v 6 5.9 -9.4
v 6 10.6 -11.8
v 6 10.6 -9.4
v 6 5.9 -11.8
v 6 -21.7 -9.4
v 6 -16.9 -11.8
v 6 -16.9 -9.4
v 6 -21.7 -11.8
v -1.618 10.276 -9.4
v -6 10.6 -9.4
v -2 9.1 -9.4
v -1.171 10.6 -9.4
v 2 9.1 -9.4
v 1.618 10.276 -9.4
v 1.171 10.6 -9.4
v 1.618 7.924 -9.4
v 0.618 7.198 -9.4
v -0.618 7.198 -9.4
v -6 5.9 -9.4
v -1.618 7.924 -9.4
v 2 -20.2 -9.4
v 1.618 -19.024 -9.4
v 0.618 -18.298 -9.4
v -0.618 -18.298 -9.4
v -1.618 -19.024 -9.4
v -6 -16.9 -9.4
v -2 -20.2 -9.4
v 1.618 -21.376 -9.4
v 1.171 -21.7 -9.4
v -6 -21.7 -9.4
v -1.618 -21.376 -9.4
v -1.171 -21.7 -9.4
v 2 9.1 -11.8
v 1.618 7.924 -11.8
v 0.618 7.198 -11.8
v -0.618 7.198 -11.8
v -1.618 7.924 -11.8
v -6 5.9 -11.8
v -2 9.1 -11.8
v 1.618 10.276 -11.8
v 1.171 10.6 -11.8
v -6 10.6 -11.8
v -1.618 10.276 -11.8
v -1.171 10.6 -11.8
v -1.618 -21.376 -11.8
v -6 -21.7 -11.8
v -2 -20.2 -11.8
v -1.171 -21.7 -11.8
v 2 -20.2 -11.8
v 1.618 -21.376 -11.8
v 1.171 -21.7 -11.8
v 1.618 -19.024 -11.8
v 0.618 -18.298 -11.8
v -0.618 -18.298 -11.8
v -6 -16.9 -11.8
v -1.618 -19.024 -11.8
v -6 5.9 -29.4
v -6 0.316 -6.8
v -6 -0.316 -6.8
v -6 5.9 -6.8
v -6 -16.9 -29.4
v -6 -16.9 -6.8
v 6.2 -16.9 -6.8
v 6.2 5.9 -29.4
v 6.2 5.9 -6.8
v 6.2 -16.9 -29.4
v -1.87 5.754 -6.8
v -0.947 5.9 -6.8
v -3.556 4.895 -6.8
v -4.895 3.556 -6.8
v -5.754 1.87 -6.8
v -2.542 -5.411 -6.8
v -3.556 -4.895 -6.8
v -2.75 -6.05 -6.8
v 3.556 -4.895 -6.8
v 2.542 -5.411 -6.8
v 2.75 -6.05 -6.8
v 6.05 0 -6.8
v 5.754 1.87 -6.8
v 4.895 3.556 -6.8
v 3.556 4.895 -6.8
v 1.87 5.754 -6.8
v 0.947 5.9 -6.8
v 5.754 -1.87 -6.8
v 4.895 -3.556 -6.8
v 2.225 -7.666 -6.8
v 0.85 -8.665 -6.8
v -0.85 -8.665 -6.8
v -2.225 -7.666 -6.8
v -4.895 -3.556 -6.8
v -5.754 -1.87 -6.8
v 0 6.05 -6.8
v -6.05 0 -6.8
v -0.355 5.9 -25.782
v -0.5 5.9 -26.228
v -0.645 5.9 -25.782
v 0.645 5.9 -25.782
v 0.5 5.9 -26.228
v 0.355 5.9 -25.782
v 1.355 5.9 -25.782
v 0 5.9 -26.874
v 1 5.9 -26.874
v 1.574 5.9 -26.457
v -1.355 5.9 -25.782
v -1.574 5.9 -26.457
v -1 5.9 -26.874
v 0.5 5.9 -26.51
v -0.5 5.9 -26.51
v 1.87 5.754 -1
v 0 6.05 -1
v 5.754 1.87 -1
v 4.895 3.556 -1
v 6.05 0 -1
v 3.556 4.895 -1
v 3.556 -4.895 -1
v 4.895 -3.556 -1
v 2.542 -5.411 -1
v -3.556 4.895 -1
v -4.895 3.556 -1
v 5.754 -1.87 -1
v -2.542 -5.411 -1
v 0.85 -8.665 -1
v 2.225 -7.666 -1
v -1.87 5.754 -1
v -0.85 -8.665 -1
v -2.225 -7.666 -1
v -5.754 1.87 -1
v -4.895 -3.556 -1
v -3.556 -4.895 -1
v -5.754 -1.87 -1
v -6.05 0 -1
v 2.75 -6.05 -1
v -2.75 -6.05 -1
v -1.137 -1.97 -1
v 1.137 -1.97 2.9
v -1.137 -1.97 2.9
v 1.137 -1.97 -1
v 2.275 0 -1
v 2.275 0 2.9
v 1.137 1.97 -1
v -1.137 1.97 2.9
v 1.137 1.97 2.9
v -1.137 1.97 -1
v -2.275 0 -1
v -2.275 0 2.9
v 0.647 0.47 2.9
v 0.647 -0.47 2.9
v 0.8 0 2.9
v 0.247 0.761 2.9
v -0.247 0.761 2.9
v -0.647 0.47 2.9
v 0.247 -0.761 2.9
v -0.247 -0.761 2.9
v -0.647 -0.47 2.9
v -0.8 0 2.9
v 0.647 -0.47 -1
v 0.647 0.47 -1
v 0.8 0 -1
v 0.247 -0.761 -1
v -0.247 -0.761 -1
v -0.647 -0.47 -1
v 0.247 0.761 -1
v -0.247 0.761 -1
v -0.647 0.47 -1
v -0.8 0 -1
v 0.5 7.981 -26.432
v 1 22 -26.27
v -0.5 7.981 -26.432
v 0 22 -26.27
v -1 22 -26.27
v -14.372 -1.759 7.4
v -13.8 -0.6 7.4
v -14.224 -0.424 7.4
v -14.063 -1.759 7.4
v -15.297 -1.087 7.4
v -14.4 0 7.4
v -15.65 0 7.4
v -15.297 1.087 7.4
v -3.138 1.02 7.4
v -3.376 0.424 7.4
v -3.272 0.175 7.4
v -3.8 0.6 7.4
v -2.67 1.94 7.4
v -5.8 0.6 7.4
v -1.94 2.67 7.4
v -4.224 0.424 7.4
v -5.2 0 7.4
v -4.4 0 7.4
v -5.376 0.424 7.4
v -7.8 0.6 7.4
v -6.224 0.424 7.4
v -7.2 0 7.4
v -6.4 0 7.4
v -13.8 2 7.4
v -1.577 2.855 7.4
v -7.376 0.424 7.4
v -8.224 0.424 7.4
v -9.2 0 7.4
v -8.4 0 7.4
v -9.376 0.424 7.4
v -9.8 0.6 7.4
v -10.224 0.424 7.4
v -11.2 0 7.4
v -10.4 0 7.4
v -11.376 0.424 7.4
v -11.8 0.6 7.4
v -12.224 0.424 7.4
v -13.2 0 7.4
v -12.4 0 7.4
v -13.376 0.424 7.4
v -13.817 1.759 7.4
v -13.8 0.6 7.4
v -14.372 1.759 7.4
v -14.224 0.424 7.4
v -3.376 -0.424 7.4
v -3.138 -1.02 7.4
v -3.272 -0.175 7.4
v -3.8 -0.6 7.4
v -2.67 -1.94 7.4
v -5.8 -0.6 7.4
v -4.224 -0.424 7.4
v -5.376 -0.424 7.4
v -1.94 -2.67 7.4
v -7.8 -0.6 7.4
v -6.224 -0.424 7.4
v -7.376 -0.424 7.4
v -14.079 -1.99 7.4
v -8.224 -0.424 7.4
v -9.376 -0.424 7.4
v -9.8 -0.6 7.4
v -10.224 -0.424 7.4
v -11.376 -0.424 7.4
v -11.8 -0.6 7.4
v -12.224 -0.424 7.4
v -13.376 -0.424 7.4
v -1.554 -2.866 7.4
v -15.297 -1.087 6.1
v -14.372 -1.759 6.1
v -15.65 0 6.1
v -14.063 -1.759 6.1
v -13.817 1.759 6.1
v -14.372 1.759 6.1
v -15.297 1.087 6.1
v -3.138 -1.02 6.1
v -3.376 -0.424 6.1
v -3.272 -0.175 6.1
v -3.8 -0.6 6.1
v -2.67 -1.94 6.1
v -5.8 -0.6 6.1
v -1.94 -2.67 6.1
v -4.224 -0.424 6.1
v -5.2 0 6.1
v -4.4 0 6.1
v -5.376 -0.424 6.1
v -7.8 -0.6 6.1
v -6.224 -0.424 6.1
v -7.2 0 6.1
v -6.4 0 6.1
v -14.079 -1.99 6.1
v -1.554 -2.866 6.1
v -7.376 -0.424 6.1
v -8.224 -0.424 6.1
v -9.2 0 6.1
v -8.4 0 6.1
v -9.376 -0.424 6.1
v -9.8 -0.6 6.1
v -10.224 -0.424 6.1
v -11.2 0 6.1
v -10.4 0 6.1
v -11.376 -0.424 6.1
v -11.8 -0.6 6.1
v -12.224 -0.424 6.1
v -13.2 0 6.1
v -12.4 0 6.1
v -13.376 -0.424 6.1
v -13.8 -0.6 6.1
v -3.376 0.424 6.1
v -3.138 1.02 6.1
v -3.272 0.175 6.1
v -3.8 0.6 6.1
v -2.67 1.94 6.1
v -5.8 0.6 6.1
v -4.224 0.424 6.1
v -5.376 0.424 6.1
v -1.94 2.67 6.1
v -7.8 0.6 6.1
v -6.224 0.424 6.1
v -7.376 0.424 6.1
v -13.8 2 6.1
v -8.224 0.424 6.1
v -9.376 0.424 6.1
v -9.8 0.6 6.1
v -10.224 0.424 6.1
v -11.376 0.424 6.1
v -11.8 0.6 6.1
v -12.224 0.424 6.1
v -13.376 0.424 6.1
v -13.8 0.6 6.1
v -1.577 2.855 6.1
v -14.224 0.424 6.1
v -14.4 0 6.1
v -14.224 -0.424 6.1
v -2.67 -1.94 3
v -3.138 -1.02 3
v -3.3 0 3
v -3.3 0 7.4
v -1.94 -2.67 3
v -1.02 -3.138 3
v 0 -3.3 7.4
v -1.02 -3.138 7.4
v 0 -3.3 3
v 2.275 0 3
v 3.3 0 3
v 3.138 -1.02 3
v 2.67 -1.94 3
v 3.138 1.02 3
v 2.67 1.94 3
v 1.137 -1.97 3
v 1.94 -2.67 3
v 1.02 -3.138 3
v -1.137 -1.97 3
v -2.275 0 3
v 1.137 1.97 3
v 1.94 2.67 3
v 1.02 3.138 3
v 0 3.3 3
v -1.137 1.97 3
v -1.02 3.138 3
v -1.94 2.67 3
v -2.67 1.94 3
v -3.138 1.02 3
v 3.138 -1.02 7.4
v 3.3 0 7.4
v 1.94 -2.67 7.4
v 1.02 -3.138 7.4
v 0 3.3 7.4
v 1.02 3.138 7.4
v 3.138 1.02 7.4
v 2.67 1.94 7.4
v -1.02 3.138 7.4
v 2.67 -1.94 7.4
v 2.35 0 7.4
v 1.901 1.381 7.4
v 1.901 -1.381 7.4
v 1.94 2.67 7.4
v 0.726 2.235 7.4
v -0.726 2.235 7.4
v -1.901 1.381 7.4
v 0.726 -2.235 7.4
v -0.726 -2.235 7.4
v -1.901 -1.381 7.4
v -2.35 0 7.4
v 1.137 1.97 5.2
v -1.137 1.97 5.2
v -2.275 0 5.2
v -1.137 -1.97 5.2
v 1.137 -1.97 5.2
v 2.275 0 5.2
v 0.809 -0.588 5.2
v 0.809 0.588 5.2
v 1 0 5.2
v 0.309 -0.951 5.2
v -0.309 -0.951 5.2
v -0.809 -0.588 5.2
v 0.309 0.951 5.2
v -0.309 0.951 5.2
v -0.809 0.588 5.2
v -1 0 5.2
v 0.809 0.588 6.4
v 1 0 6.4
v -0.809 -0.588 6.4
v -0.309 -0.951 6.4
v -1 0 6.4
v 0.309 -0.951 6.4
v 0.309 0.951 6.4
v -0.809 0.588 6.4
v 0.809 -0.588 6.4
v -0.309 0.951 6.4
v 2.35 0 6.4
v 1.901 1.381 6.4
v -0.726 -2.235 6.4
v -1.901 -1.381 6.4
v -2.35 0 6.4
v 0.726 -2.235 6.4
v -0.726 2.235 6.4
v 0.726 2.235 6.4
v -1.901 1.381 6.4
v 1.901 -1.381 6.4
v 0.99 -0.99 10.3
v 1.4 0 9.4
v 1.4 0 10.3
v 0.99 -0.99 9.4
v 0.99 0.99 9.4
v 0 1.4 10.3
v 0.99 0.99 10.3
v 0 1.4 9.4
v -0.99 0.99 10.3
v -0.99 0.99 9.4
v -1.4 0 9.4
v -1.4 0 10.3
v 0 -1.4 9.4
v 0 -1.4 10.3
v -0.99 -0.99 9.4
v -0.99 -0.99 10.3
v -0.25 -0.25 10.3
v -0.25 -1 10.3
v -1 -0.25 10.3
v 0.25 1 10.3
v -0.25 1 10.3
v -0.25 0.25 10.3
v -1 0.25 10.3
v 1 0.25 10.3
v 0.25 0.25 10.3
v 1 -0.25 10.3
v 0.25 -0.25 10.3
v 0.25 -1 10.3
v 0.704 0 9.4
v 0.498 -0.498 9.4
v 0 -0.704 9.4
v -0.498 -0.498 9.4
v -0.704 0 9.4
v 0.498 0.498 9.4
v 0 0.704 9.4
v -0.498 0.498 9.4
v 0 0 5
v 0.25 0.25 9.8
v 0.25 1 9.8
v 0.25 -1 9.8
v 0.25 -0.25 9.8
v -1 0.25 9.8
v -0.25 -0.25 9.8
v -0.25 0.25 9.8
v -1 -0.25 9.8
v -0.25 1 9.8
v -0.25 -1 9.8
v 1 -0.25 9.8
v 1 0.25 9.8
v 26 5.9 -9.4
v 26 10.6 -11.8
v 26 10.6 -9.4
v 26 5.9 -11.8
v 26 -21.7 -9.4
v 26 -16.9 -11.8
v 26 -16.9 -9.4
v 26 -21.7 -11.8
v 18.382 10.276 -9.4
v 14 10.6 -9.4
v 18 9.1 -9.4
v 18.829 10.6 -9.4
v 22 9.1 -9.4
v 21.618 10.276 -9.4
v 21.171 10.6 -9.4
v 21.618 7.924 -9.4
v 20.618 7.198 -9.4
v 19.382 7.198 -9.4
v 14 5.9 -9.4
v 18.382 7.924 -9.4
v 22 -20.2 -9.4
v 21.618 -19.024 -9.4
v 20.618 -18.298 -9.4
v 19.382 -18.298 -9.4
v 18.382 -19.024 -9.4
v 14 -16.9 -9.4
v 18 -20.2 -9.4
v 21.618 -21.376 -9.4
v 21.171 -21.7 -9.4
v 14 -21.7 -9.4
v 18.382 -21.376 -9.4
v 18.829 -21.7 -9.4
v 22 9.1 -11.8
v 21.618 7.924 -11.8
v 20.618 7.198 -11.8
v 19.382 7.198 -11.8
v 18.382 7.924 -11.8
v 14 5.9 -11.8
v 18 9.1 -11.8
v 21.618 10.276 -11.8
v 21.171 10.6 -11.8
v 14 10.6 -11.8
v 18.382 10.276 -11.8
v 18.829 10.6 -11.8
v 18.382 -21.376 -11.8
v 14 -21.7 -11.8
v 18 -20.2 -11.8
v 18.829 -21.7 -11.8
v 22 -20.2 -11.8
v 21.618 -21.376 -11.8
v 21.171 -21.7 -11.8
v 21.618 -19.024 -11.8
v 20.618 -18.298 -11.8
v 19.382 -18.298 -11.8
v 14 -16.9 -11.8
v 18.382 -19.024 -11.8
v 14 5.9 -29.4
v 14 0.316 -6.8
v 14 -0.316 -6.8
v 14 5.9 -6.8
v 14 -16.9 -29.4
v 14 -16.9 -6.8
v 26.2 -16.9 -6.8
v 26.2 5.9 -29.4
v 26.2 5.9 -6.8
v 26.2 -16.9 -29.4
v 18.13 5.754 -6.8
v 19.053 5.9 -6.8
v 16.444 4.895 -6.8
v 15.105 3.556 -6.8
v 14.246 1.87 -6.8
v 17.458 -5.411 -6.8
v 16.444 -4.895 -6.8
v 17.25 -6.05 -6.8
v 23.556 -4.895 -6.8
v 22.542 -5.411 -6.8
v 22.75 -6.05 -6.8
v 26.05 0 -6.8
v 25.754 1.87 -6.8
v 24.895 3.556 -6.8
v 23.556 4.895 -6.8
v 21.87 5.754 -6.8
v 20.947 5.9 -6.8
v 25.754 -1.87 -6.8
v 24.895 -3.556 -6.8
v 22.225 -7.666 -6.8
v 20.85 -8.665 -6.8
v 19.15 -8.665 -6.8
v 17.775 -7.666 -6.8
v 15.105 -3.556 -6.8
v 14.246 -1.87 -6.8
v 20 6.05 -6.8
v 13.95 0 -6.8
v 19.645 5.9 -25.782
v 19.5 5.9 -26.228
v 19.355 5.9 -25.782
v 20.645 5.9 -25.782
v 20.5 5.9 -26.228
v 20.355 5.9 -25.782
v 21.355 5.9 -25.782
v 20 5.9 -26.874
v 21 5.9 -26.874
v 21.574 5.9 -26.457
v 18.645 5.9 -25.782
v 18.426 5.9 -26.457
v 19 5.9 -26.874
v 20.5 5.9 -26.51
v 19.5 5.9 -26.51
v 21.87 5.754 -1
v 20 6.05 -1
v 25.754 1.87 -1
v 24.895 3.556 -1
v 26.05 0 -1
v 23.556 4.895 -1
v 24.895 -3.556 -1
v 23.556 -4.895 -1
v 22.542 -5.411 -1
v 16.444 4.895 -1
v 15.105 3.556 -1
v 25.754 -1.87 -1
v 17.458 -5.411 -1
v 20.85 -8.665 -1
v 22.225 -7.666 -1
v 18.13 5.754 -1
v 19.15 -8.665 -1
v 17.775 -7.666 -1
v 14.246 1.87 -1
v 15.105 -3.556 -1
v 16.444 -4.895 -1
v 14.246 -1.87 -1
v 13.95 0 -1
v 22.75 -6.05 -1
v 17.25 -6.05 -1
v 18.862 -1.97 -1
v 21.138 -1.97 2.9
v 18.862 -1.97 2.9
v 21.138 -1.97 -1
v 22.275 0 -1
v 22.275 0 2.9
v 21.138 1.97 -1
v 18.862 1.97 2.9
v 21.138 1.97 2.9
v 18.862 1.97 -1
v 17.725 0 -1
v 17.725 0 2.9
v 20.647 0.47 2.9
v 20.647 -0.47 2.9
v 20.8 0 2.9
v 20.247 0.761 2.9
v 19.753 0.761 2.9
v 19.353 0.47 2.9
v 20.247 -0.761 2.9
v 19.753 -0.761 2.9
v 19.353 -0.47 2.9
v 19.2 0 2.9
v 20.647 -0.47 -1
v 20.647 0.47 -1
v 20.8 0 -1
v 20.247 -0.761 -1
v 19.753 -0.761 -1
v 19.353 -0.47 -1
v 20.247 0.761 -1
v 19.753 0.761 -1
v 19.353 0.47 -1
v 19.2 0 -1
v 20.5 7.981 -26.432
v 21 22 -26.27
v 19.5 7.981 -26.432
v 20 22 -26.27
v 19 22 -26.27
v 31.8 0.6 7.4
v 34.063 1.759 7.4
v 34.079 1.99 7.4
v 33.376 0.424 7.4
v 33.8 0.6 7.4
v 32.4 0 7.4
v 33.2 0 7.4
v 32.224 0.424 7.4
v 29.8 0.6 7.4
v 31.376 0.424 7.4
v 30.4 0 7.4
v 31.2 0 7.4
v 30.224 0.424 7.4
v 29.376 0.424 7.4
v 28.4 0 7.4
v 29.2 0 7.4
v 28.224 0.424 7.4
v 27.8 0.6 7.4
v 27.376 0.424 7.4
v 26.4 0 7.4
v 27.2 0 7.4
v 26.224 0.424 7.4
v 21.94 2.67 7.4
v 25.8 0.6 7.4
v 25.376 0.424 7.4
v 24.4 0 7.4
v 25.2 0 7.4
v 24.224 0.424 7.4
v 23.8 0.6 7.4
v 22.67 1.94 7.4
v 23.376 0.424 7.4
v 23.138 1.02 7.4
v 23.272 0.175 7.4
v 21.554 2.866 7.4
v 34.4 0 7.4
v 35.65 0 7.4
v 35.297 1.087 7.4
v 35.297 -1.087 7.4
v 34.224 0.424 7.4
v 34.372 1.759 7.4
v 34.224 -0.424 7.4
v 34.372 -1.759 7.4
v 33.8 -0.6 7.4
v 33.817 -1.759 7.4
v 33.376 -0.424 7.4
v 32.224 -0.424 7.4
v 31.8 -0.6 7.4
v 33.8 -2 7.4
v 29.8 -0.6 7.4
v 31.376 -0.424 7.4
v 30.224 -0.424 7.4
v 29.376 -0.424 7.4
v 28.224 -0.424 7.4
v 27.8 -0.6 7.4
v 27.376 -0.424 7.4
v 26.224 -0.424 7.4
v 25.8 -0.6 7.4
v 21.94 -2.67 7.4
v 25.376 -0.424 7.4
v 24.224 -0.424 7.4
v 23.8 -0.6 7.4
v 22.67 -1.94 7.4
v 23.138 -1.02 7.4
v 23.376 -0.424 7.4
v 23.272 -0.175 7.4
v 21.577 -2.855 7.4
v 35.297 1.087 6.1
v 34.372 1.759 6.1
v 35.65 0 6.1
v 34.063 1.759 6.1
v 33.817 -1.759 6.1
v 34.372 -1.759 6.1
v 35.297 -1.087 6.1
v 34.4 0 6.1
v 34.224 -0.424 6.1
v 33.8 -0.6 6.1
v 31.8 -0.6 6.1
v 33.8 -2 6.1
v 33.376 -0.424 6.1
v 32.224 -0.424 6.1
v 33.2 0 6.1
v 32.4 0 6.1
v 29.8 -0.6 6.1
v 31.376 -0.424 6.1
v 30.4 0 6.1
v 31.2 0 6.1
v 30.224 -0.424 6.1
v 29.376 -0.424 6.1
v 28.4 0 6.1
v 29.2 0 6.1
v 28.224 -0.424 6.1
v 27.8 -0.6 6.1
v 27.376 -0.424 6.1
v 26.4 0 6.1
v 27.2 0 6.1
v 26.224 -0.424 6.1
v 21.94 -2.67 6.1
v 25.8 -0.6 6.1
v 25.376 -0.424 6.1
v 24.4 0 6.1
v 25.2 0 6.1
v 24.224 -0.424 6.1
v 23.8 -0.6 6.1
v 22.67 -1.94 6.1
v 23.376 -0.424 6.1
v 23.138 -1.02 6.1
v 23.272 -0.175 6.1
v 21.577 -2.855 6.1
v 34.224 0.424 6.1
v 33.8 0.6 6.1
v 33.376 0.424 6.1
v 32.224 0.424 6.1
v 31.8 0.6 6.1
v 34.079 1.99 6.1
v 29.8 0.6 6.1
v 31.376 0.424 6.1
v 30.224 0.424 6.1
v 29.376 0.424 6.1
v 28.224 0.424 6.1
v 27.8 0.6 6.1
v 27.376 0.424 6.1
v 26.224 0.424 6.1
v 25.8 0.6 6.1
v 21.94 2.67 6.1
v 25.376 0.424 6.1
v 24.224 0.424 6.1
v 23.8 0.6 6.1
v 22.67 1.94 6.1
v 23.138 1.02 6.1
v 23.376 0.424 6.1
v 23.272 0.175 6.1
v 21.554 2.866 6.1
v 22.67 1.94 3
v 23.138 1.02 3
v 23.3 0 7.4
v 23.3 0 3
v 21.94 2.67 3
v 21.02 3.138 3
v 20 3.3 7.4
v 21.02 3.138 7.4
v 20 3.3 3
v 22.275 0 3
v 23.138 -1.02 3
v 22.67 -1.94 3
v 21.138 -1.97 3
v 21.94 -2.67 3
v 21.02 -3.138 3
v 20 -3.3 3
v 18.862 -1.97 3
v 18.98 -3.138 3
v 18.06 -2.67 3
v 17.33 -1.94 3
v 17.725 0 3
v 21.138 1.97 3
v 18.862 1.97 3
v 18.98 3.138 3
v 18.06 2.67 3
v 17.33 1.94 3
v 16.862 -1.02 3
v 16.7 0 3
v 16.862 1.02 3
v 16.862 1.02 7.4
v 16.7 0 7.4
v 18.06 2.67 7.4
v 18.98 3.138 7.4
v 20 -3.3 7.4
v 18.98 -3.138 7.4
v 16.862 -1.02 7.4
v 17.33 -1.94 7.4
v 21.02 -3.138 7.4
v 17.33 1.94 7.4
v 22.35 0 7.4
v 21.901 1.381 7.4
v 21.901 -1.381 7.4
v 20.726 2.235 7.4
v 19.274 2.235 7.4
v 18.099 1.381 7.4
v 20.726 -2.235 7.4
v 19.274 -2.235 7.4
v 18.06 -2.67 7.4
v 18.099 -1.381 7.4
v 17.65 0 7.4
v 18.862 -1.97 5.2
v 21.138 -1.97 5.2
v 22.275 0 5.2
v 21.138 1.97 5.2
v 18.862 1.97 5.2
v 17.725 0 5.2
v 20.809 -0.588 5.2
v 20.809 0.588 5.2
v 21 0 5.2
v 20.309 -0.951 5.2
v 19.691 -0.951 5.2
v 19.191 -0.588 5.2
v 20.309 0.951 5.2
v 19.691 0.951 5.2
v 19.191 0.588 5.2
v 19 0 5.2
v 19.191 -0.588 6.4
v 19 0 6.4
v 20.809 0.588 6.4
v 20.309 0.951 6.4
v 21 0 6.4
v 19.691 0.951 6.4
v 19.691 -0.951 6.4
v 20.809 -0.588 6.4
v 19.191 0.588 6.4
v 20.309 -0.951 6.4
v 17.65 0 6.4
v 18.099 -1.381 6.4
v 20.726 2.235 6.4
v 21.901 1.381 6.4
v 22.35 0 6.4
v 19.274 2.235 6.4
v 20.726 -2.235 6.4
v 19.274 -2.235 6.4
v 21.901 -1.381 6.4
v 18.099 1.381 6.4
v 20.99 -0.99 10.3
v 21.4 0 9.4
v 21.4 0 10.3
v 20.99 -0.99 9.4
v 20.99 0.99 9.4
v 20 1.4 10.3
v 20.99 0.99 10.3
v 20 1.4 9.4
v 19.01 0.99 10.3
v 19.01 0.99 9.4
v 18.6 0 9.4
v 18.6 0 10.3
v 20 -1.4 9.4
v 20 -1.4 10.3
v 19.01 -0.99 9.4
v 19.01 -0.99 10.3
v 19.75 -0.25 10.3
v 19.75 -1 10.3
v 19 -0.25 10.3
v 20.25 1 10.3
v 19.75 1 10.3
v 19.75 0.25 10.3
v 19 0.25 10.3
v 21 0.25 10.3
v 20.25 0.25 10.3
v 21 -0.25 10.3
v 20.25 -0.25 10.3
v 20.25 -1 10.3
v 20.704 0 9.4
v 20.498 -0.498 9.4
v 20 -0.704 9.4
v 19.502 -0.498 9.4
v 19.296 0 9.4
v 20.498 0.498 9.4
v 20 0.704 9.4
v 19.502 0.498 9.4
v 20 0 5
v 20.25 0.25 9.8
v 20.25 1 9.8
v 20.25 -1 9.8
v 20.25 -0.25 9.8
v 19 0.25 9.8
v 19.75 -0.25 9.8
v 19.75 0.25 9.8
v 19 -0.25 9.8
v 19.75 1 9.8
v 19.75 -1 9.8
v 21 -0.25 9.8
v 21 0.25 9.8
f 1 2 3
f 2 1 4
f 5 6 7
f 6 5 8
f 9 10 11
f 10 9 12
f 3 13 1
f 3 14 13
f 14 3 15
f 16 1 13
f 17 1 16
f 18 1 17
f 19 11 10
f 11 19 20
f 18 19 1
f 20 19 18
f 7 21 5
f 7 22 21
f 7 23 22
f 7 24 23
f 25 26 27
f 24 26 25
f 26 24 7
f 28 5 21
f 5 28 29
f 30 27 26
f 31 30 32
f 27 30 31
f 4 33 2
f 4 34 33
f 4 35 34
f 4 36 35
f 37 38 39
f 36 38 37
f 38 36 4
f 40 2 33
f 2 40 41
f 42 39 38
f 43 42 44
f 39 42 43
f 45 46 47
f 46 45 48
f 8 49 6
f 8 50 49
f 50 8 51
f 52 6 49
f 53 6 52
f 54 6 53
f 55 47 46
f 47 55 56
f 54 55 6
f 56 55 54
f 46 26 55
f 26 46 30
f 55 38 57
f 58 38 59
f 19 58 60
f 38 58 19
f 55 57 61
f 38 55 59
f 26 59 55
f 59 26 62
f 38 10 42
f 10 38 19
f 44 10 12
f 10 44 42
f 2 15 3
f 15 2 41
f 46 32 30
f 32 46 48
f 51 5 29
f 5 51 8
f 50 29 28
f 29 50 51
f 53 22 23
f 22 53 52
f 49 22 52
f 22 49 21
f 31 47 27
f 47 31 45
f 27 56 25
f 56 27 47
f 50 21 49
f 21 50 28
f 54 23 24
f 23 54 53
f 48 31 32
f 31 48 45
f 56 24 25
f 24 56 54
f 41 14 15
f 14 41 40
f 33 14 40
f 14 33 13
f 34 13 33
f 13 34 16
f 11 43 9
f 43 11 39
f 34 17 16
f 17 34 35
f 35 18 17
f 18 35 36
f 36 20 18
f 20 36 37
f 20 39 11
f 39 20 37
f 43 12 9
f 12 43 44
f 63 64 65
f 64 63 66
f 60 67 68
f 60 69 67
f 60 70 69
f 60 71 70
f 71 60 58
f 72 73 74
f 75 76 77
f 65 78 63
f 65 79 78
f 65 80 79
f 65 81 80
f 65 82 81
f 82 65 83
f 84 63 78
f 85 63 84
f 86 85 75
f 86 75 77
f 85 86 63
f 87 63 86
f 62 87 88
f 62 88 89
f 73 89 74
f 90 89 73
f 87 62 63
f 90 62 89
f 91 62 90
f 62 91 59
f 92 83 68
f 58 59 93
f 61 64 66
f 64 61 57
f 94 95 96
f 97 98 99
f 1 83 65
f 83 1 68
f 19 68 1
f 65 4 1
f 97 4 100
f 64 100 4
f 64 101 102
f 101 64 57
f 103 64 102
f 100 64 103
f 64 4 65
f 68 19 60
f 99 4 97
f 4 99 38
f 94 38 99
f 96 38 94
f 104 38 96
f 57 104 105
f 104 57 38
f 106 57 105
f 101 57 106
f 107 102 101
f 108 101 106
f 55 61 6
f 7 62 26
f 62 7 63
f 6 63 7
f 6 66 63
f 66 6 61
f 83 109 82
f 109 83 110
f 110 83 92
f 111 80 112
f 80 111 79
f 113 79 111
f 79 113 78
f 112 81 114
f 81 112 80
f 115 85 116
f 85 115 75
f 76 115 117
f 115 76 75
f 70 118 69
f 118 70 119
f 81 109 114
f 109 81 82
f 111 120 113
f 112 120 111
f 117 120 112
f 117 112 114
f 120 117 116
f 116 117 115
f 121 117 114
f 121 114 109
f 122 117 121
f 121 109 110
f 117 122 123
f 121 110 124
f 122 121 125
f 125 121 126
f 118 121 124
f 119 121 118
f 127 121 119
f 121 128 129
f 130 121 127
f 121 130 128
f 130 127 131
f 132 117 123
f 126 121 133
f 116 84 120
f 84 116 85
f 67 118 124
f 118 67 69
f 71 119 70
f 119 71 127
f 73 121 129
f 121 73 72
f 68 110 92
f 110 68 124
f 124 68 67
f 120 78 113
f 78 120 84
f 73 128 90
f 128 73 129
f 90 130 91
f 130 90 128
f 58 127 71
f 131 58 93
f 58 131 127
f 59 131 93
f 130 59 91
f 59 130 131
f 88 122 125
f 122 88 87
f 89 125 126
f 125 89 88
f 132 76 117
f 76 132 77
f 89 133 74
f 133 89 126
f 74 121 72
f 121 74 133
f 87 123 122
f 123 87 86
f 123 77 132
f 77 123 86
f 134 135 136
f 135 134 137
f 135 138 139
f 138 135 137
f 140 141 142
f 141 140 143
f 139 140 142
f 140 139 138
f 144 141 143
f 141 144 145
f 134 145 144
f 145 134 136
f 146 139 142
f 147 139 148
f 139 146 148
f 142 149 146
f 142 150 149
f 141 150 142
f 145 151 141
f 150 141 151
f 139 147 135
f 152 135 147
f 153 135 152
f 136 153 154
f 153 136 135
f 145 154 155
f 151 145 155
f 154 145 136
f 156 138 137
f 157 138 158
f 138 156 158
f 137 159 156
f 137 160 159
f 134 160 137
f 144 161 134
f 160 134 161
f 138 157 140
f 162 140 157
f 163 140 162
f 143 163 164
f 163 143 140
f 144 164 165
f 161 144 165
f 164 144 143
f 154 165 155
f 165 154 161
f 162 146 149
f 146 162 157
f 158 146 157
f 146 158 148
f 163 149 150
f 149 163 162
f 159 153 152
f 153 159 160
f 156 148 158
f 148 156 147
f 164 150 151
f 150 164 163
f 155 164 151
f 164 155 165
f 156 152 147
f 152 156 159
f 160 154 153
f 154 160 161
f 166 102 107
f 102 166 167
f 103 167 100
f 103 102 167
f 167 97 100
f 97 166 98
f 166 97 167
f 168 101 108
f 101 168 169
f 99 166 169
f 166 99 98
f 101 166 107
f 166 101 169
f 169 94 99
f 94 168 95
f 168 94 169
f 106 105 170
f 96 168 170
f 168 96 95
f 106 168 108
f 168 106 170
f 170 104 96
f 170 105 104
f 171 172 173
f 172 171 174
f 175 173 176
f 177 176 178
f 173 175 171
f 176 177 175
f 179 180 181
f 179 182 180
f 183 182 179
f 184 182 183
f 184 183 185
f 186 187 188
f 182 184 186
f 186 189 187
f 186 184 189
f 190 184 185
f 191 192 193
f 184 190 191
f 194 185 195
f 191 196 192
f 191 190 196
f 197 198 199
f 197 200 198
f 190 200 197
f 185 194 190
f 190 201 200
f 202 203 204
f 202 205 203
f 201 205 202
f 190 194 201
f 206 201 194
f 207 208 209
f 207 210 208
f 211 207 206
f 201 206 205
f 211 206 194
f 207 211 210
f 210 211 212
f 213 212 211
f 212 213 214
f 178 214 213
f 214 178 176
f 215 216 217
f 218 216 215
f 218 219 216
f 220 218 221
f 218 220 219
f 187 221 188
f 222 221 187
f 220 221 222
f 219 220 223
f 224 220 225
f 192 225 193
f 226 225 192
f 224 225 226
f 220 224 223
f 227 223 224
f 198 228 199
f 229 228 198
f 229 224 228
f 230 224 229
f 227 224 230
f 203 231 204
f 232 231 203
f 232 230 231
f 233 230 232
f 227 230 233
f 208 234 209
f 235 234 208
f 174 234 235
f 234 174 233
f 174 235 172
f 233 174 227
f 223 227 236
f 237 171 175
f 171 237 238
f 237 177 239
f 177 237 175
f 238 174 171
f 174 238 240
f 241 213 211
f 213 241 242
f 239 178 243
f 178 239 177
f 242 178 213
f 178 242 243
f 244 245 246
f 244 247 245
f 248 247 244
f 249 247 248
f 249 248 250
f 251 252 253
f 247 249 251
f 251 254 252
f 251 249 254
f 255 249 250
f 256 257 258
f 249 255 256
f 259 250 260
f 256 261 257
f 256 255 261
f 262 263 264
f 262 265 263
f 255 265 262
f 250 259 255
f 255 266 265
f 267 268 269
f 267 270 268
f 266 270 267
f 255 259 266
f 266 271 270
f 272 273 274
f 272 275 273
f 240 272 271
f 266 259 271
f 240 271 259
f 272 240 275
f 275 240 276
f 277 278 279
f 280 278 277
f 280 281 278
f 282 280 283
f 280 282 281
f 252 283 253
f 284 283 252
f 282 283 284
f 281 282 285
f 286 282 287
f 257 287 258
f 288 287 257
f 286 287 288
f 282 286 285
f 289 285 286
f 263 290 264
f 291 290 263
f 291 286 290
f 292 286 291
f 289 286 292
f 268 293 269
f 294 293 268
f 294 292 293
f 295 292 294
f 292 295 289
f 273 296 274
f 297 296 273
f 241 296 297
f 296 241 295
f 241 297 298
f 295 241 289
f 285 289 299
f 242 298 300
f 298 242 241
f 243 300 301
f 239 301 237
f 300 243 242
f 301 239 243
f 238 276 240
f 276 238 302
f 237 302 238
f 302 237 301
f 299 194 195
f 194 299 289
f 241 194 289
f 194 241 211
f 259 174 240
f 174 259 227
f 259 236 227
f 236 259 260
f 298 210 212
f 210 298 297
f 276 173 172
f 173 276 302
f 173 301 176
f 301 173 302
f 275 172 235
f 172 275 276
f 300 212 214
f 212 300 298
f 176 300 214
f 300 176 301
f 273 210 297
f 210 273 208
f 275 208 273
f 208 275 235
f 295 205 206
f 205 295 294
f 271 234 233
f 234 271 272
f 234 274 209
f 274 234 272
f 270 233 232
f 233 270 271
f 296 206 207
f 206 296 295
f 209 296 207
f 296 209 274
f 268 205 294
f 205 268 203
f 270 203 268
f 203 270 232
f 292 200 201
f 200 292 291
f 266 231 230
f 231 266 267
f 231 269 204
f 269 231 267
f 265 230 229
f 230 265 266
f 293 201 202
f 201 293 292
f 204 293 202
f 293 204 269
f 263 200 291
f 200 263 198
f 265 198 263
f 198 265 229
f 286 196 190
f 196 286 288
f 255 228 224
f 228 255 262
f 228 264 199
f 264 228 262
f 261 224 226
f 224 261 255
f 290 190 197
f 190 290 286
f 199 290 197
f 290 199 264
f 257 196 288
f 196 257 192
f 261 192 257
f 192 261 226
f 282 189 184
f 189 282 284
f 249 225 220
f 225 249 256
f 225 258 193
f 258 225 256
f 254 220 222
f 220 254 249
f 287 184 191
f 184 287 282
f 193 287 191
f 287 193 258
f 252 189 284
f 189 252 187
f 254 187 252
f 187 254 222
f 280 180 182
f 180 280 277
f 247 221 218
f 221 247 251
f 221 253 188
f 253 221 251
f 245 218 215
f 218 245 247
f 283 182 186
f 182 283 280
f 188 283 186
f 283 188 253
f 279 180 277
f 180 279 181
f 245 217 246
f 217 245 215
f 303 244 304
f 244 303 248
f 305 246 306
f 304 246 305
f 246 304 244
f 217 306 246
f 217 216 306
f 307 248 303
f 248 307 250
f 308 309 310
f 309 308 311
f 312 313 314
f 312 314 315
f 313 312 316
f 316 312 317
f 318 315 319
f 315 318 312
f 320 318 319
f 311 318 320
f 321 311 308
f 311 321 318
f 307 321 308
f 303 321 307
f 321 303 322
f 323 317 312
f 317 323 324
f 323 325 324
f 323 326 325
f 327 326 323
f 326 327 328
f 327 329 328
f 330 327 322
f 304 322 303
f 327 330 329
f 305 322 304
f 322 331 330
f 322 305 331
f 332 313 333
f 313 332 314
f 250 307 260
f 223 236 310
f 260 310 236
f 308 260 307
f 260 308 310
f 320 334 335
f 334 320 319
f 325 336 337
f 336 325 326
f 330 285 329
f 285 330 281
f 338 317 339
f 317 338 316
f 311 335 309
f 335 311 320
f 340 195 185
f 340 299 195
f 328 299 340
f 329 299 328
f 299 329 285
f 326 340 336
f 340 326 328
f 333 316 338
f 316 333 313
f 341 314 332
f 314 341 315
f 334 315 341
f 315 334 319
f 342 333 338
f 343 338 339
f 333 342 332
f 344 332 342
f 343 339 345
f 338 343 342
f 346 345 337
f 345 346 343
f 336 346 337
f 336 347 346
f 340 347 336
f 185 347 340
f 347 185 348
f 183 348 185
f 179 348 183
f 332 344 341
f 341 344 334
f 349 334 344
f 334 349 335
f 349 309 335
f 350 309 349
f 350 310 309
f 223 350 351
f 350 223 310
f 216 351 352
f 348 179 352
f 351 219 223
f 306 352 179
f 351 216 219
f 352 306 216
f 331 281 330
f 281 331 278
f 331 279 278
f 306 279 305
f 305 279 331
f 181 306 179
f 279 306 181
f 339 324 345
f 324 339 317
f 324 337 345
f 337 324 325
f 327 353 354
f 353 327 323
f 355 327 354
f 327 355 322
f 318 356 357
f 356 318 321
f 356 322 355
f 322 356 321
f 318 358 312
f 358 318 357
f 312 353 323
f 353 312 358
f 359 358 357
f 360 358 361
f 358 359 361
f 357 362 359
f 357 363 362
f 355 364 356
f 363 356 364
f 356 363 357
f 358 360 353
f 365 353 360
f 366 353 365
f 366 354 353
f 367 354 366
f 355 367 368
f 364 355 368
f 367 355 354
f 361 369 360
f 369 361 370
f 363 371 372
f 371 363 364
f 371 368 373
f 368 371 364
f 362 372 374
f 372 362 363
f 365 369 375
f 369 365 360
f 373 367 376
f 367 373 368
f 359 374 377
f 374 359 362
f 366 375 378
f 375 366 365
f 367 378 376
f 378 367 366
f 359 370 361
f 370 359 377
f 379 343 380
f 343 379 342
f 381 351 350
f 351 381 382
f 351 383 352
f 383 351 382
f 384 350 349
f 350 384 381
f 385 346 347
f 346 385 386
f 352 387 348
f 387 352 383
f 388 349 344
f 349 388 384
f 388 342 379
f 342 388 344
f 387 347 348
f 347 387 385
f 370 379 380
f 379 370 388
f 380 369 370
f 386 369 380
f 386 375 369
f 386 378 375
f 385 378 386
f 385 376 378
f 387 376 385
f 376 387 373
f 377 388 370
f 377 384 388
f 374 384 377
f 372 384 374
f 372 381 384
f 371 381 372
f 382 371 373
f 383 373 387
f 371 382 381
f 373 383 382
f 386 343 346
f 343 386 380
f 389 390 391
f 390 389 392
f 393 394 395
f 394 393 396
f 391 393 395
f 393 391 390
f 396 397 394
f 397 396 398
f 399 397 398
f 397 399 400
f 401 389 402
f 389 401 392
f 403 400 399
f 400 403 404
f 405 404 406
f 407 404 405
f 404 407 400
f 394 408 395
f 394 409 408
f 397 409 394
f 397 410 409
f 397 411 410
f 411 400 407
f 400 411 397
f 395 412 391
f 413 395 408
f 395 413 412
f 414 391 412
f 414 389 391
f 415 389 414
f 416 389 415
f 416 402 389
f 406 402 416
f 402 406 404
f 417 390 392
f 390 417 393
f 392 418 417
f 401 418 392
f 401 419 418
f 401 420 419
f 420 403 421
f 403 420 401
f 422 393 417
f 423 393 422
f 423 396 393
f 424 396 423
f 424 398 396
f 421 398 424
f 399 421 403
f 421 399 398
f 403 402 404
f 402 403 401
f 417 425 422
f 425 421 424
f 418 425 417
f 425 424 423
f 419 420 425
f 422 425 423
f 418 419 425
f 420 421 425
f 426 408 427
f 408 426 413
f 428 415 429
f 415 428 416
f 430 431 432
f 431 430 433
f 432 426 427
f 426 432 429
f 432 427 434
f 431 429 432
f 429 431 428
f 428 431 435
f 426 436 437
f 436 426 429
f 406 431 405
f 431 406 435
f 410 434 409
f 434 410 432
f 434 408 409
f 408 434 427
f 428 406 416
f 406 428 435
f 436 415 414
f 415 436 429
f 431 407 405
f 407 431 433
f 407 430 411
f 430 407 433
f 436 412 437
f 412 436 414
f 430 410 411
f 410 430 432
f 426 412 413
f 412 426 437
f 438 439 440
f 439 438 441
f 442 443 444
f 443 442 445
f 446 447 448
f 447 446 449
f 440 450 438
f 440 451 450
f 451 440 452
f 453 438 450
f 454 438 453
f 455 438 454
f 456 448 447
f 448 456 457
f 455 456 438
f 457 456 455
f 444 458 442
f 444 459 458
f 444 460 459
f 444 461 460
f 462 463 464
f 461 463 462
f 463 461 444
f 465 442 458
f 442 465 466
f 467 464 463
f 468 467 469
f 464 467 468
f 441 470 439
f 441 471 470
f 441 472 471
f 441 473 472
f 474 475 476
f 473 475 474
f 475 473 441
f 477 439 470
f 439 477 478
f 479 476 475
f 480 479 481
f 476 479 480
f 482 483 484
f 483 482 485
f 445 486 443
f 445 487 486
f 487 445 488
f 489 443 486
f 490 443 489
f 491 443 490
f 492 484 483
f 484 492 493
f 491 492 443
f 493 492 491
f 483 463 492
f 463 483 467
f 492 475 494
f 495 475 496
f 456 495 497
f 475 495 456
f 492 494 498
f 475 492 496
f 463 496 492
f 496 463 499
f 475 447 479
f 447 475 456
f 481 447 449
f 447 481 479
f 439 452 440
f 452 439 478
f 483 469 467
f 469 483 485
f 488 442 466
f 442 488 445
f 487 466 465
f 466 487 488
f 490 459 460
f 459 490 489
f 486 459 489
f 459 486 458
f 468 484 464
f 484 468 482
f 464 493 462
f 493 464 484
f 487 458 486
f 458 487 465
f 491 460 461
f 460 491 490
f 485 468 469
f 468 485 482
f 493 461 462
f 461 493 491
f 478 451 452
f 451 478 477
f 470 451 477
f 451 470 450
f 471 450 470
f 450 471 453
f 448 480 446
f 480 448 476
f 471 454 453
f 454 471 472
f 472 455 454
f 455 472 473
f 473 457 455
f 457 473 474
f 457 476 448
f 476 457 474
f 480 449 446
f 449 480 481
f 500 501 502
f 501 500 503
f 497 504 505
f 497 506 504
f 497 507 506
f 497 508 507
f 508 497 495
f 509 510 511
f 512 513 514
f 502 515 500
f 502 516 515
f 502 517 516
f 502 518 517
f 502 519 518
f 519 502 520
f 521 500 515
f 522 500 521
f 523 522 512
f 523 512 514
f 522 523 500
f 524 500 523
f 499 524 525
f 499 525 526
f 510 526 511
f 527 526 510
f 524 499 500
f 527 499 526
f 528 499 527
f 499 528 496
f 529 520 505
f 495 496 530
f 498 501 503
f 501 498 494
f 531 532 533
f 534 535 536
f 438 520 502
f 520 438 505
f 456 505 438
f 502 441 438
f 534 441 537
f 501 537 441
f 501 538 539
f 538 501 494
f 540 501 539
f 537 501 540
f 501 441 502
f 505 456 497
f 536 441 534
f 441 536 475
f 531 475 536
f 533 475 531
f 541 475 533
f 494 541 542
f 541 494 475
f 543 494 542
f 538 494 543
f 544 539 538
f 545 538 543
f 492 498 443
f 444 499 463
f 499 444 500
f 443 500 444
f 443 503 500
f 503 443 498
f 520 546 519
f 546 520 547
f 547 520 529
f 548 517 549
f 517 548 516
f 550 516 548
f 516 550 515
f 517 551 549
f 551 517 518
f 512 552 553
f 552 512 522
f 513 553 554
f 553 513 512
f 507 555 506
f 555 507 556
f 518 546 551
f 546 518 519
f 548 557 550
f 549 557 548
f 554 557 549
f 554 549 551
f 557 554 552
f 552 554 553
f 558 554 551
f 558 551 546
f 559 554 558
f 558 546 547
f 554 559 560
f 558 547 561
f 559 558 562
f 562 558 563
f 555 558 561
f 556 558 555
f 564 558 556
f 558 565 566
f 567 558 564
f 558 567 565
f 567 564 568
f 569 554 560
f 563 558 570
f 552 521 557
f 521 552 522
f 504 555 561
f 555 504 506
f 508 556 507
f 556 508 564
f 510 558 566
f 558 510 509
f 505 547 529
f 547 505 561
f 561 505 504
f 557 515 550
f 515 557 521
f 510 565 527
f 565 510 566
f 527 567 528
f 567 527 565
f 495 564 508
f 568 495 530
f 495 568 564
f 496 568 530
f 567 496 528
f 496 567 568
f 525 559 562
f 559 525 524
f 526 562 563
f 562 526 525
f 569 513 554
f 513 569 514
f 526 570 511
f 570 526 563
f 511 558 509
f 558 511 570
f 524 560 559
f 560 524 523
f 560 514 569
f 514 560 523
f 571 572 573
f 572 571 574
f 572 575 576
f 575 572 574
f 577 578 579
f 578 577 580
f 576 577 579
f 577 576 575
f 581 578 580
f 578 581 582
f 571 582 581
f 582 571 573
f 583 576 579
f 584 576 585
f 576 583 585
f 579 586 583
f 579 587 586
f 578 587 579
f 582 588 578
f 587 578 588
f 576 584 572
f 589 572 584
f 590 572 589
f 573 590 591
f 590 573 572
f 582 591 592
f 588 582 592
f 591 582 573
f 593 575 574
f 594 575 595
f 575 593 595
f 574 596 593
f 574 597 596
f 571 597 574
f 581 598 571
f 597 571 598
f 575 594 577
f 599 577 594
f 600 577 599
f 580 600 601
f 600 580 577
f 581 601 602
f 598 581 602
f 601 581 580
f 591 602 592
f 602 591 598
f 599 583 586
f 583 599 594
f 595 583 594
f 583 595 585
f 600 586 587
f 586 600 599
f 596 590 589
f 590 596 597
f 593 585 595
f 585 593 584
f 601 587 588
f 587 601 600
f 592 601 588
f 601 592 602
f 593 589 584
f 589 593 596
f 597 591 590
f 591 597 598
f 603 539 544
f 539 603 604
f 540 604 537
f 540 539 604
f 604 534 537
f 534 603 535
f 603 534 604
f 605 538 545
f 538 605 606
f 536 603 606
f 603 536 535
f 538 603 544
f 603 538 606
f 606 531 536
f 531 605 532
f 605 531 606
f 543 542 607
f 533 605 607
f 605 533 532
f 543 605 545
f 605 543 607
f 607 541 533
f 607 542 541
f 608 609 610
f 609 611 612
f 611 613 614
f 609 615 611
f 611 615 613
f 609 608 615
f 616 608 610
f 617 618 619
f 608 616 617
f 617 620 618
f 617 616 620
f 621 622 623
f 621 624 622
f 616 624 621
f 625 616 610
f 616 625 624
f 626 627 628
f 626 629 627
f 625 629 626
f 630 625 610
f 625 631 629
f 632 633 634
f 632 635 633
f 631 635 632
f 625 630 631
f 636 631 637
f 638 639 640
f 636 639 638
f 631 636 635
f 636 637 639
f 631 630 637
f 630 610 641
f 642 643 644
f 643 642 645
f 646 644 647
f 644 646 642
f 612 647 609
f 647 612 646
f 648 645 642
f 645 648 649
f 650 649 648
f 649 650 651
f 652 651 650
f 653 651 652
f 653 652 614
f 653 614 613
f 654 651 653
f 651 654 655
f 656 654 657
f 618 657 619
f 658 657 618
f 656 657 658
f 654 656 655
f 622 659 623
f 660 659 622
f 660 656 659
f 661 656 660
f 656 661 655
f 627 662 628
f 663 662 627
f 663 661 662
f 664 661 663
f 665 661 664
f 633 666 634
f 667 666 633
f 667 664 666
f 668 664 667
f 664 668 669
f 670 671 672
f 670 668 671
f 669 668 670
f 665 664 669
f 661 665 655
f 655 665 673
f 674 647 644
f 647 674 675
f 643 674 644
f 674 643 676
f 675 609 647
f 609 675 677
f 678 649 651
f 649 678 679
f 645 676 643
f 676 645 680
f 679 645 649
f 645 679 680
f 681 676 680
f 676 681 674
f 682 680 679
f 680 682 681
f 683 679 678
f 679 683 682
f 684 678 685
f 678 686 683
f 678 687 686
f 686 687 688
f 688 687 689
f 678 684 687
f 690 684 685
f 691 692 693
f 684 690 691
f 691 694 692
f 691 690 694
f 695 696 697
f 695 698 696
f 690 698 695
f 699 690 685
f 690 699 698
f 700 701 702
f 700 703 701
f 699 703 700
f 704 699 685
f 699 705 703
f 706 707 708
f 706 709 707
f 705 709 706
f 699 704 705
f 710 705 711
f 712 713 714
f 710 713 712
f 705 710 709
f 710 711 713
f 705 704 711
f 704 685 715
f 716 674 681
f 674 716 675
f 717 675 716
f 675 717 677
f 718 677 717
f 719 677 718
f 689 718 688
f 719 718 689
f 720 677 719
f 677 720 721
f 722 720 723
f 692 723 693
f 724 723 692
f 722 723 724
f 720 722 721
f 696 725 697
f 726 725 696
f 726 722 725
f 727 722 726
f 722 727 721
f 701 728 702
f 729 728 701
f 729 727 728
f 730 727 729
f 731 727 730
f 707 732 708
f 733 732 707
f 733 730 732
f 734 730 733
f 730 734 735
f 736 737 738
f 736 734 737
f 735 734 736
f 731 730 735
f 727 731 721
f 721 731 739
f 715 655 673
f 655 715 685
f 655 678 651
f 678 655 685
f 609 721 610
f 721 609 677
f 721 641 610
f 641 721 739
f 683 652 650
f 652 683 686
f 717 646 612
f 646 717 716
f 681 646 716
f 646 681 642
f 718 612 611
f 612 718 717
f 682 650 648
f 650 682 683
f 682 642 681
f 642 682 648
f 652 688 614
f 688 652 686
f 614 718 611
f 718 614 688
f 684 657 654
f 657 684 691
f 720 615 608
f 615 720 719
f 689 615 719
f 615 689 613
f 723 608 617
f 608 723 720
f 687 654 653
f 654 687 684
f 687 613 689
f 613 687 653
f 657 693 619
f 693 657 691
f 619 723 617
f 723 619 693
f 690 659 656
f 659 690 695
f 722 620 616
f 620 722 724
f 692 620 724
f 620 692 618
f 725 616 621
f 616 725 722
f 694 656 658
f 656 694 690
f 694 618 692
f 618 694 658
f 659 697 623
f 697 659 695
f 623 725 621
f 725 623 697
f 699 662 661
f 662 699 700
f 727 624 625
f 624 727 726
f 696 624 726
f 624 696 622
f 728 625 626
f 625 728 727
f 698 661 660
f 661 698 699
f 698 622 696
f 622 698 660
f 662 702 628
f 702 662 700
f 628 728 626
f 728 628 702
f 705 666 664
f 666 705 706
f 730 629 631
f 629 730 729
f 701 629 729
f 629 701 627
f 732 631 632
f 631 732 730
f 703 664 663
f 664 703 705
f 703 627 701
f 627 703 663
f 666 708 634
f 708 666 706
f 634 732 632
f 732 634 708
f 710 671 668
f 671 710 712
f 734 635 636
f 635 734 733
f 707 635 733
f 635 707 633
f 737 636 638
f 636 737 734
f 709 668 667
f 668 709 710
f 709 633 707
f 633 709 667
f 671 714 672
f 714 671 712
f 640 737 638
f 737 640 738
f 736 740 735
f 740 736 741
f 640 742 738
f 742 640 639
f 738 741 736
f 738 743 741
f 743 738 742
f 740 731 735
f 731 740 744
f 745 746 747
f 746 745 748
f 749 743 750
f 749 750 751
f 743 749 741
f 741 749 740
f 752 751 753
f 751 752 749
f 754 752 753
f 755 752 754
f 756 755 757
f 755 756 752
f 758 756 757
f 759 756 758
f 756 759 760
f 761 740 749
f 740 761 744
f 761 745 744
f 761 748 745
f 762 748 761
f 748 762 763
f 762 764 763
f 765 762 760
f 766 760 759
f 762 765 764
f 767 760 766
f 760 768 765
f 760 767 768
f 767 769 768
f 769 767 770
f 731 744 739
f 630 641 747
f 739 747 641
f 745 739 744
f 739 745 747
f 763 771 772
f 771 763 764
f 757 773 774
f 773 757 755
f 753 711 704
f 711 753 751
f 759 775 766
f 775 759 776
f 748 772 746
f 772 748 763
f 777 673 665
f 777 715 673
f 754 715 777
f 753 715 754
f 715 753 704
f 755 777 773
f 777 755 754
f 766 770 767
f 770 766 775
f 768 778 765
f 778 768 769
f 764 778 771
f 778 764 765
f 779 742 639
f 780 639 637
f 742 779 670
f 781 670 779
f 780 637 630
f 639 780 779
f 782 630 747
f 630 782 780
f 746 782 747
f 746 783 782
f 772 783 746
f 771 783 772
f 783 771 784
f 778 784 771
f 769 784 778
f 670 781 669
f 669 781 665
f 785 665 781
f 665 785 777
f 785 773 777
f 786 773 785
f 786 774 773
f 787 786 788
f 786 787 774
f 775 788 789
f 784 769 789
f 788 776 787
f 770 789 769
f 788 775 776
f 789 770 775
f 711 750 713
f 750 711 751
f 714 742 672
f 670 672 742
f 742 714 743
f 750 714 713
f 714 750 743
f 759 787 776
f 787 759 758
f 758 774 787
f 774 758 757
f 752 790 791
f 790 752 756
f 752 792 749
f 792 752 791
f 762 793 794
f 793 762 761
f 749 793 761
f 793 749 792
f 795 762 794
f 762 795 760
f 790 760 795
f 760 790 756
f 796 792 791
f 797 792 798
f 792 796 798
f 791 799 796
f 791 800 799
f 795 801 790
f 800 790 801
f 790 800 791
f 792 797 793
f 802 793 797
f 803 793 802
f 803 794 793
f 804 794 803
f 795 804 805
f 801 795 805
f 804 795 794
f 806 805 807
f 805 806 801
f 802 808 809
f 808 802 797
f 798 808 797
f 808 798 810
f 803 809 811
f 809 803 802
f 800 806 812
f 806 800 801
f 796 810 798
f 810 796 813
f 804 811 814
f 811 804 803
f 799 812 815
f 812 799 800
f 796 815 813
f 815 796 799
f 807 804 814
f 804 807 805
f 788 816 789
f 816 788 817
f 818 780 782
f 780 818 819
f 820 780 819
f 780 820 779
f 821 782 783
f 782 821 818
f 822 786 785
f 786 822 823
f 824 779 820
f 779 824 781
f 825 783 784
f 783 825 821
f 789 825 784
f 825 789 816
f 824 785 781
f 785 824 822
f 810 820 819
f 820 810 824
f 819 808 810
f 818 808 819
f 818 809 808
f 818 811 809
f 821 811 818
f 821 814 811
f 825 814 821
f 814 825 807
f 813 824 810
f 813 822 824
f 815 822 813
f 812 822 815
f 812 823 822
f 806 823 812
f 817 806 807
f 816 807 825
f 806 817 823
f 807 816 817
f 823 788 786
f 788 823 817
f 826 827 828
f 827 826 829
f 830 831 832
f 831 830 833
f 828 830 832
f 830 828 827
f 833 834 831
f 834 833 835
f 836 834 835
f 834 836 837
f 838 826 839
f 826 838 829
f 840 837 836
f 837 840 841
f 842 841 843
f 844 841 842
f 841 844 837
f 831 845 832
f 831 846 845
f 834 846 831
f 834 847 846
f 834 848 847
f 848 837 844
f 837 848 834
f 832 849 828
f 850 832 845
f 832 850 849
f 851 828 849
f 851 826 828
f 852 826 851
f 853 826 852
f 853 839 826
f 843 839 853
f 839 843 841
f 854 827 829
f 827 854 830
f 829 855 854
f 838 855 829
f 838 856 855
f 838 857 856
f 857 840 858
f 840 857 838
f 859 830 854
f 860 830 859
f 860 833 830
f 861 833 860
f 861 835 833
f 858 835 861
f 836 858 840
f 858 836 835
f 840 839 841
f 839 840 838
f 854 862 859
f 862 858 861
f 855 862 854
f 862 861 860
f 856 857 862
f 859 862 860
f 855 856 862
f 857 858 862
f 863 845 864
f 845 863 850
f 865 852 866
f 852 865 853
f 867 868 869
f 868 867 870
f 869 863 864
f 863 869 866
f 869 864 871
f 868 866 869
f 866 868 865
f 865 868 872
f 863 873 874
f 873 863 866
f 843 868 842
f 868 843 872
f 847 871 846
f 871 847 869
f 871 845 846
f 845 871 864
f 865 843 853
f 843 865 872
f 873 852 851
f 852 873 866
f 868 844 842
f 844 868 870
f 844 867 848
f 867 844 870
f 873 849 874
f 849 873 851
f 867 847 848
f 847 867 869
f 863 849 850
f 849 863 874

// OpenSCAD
use <../parts.scad>

SG90();
translate([0, 0, 3]) rotate(180) SG90_single_horn();
translate([0, 0, 6]) SG90_horn_screw();

translate([20, 0, 0]) {
    SG90();
    translate([0, 0, 3]) rotate(0) SG90_single_horn();
    translate([0, 0, 6]) SG90_horn_screw();
}
